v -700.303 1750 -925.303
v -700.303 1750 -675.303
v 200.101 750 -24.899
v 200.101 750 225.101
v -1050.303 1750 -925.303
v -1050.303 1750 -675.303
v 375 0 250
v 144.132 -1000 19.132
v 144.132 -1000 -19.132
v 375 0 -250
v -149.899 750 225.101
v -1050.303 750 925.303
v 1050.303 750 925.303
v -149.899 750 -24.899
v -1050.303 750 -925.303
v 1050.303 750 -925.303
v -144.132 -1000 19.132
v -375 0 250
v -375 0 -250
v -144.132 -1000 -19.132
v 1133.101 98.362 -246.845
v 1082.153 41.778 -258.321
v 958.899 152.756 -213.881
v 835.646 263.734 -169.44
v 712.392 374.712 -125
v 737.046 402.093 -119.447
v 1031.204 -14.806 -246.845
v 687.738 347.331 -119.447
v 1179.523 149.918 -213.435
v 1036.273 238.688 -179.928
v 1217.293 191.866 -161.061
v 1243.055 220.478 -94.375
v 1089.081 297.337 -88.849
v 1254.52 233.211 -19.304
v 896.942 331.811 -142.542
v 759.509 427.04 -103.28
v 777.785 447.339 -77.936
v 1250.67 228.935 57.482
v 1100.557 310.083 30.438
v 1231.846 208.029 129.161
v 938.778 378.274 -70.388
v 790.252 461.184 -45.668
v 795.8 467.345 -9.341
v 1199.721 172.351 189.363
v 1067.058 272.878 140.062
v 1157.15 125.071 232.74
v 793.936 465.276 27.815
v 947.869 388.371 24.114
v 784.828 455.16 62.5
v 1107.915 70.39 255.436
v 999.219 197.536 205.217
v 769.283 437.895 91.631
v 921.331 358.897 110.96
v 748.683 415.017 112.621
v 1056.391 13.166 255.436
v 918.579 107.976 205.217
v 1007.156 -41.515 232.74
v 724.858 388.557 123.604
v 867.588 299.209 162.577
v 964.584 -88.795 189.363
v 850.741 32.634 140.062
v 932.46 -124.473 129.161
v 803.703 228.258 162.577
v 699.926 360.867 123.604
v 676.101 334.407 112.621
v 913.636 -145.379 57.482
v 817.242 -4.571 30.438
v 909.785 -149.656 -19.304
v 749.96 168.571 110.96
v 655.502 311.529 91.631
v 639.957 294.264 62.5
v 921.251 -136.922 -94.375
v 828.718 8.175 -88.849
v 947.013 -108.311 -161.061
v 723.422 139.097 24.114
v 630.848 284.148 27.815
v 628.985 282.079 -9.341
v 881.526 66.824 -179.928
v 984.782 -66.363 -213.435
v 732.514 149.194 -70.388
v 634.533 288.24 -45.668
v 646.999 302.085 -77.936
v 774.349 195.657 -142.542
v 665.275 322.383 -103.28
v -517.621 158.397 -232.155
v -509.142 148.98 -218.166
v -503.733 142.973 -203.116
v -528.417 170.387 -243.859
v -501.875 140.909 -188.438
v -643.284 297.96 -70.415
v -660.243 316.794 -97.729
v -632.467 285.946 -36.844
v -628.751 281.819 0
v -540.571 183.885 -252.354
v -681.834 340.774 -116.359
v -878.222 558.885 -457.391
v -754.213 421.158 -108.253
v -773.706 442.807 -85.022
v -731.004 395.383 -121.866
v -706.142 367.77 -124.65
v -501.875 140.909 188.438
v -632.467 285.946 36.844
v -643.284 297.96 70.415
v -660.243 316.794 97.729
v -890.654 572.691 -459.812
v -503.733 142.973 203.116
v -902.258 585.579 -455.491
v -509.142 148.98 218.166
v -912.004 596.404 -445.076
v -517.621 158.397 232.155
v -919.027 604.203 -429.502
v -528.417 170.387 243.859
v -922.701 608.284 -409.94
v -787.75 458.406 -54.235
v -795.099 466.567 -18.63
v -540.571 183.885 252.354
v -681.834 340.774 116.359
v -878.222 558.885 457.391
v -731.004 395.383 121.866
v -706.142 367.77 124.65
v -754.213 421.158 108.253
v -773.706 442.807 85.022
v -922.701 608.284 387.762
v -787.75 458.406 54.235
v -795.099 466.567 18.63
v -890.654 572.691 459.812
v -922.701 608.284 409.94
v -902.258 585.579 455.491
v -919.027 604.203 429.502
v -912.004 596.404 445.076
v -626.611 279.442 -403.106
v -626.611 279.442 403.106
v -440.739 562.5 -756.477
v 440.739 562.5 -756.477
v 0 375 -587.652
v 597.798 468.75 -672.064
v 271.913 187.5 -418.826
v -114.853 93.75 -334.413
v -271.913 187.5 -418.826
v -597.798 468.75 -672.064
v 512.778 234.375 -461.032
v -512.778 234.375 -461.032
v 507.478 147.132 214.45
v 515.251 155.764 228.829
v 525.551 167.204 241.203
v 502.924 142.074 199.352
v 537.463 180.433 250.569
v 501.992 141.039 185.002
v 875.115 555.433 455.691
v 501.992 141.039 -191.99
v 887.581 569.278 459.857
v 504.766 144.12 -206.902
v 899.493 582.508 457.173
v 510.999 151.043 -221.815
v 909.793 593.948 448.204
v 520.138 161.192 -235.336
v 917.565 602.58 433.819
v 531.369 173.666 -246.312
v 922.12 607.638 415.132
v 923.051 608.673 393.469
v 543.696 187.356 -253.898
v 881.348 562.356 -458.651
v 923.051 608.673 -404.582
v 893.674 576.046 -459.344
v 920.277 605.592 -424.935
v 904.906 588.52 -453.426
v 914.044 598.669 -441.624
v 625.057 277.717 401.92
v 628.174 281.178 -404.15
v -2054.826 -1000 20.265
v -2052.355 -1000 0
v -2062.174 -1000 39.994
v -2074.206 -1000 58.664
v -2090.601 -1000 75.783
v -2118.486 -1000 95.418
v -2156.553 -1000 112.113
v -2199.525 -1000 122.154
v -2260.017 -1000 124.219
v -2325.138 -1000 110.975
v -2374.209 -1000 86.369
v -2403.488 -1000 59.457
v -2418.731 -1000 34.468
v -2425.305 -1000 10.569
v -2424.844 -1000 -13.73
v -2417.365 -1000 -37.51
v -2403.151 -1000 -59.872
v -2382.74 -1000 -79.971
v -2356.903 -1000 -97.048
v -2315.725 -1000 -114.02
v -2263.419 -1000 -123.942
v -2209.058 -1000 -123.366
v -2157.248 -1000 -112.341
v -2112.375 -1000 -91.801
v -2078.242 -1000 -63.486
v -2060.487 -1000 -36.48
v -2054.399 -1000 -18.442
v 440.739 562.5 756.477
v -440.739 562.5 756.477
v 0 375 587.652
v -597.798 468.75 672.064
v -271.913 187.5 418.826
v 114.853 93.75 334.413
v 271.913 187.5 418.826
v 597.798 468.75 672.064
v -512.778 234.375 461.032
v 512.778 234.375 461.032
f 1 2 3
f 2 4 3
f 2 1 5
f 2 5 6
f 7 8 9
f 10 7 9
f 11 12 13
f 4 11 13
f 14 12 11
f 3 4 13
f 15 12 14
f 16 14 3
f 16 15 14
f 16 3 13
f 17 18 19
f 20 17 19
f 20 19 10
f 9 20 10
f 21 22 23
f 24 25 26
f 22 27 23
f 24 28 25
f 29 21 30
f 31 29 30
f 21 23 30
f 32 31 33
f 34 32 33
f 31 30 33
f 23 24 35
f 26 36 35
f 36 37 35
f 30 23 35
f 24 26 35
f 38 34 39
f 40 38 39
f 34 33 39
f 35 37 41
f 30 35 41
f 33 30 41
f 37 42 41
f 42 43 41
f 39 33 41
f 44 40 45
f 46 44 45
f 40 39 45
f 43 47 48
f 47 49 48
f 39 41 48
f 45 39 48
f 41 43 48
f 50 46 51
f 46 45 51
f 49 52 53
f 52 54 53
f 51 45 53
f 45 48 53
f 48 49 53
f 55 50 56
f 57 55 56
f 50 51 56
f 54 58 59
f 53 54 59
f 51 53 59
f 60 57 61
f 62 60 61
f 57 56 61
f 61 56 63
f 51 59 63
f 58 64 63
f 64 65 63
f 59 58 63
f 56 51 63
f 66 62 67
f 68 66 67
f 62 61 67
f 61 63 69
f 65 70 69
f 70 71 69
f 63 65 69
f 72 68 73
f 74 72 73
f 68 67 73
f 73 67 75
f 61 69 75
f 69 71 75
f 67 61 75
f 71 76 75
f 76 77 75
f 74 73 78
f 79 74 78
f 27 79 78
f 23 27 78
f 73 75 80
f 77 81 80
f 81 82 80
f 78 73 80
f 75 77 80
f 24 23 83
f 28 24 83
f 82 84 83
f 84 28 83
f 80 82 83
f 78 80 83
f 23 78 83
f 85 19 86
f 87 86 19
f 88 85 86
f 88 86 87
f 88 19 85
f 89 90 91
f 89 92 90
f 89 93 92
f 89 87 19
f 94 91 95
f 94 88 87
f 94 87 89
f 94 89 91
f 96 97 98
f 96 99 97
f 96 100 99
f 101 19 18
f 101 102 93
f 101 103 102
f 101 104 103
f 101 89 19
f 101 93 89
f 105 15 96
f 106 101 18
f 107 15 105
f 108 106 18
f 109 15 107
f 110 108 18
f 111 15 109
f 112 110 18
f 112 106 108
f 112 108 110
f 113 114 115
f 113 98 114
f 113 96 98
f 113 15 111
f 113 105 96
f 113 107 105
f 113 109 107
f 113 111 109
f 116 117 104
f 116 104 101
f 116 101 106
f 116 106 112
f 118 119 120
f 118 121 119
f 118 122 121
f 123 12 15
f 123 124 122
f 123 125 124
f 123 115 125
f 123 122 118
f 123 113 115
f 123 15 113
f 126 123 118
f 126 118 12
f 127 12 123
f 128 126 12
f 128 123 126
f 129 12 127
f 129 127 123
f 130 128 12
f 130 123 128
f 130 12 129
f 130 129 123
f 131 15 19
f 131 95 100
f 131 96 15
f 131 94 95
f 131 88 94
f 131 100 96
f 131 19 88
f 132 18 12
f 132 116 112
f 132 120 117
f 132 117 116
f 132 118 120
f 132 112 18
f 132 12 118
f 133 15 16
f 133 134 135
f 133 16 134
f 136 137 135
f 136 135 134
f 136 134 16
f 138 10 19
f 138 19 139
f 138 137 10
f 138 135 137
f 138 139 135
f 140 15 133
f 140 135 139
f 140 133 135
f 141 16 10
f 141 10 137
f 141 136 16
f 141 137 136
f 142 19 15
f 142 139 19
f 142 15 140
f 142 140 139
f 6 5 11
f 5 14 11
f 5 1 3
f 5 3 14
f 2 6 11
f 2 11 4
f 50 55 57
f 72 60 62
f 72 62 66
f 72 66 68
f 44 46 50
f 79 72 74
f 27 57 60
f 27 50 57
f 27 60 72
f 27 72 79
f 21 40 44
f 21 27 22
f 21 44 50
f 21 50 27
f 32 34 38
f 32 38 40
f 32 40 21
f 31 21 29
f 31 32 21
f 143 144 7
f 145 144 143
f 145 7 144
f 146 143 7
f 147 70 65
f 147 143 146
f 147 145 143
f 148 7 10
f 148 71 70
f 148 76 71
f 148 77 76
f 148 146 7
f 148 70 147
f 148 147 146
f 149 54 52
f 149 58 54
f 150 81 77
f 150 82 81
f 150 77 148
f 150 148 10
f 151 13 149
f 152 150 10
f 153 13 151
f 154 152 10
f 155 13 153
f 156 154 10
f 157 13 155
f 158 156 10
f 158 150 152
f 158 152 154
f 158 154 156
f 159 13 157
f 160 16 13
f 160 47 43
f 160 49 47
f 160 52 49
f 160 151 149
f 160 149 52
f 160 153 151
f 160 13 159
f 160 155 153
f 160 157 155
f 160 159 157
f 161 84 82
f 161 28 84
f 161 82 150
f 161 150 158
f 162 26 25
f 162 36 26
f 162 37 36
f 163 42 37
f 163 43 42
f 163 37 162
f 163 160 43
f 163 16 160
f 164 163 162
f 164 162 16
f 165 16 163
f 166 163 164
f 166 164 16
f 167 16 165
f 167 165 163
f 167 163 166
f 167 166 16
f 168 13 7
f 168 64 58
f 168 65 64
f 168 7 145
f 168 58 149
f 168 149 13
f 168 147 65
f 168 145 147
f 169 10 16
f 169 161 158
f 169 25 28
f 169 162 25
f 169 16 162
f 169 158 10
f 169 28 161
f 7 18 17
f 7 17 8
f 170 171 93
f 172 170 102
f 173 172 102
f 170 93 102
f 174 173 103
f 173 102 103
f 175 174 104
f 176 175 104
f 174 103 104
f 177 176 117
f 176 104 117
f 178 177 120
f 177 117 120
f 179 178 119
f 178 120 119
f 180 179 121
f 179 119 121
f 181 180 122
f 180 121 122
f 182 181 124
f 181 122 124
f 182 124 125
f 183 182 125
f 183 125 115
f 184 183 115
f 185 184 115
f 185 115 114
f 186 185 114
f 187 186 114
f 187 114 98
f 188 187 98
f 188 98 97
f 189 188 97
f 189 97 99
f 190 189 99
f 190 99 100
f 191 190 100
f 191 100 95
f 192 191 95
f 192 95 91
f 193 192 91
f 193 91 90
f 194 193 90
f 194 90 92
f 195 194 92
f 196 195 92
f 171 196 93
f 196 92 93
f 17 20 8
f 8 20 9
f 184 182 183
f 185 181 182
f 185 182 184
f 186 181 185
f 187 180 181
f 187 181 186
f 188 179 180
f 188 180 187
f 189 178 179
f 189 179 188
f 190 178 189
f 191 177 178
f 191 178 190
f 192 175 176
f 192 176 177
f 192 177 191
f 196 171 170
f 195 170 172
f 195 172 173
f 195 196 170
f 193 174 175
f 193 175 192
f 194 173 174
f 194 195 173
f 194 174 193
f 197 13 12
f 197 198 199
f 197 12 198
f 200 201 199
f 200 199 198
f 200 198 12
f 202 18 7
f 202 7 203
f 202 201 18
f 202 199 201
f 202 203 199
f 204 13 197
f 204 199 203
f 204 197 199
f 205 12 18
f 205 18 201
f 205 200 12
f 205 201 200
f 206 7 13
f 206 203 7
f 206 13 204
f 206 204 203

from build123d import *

# Parameters (mm, degrees)
SKETCH1_W           = 750
SKETCH1_H           = 500
BOSS_EXTRUDE1_DEPTH = 1000
BOSS_EXTRUDE1_DRAFT = -13
SKETCH1_2_W         = 750
SKETCH1_2_H         = 500
BOSS_EXTRUDE2_DEPTH = 750
BOSS_EXTRUDE2_TAPER = -42
SKETCH2_R           = 125
BOSS_EXTRUDE3_DEPTH = 497.562106
BOSS_EXTRUDE3_DRAFT = -15
BOSS_EXTRUDE4_REACH = 2194.301
SKETCH4_R           = 125


with BuildPart() as part:
    # Sketch1 → Boss-Extrude1 (with draft: the straight prism first)
    with BuildSketch(Plane(origin=(0, 0, 0), x_dir=(1, 0, 0), z_dir=(0, 1, 0))):
        Rectangle(SKETCH1_W, SKETCH1_H)
    extrude(amount=-BOSS_EXTRUDE1_DEPTH)
    # Boss-Extrude1: the draft: its side faces are tilted about the plane it starts from
    boss_extrude1_sides = [part.faces().sort_by_distance(p)[0] for p in [
        (0, -500, 250),
        (375, -500, 0),
        (0, -500, -250),
        (-375, -500, 0),
    ]]
    draft(boss_extrude1_sides, Plane(origin=(0, 0, 0), x_dir=(1, 0, 0), z_dir=(0, 1, 0)), BOSS_EXTRUDE1_DRAFT)

    # Sketch1<2> → Boss-Extrude2 (add)
    with BuildSketch(Plane(origin=(0, 0, 0), x_dir=(1, 0, 0), z_dir=(0, 1, 0))):
        Rectangle(SKETCH1_2_W, SKETCH1_2_H)
    extrude(amount=BOSS_EXTRUDE2_DEPTH, taper=BOSS_EXTRUDE2_TAPER)


with BuildPart() as boss_extrude3_tool:
    # Sketch2 → Boss-Extrude3 (with draft: the straight prism first)
    with BuildSketch(Plane(origin=(207.099086863, -186.472855382, 0), x_dir=(0, 0, -1), z_dir=(0.7431448254773932, -0.6691306063588595, 0))):
        with Locations((0, 755.148524589)):
            Circle(SKETCH2_R)
    extrude(amount=BOSS_EXTRUDE3_DEPTH)
    # Boss-Extrude3: the draft: its side faces are tilted about the plane it starts from
    boss_extrude3_sides = [boss_extrude3_tool.faces().sort_by_distance(p)[0] for p in [
        (897.272429226, 208.244846289, 125),
    ]]
    draft(boss_extrude3_sides, Plane(origin=(207.099086863, -186.472855382, 0), x_dir=(0, 0, -1), z_dir=(0.7431448254773932, -0.6691306063588595, 0)), BOSS_EXTRUDE3_DRAFT)


with BuildPart() as part_1:
    add(part.part)

    # Boss-Extrude3: add boss_extrude3_tool
    add(boss_extrude3_tool.part)

    # Boss-Extrude4: up to this plane
    boss_extrude4_end = Plane(origin=(0, -1000, 0), z_dir=(0, -1, 0))
    # Sketch4 → Boss-Extrude4 (add, up to the surface)
    with BuildSketch(Plane(origin=(-207.099086863, -186.472855382, 0), x_dir=(0, 0, 1), z_dir=(-0.7431448254773932, -0.6691306063588595, 0)), mode=Mode.PRIVATE) as boss_extrude4_sk1:
        with Locations(Location((0, 755.148524589, 0), (0, 0, 270))):
            Circle(SKETCH4_R)
    boss_extrude4_tool1 = split(extrude(boss_extrude4_sk1.sketch, amount=BOSS_EXTRUDE4_REACH, mode=Mode.PRIVATE), bisect_by=boss_extrude4_end, keep=Keep.BOTH, mode=Mode.PRIVATE)
    add(boss_extrude4_tool1.solids().sort_by_distance((-712.392077, 374.711863, 0))[0])

    # Boss-Extrude5: read off the stored shape, not the designer's step
    # Boss-Extrude5: loft between two sections, ruled curve by curve
    boss_extrude5_from = [
        Edge.make_line((-1050.303033223, 1750, -675.303033223), (-700.303033223, 1750, -675.303033223)),
        Edge.make_line((-700.303033223, 1750, -675.303033223), (-700.303033223, 1750, -925.303033223)),
        Edge.make_line((-700.303033223, 1750, -925.303033223), (-1050.303033223, 1750, -925.303033223)),
        Edge.make_line((-1050.303033223, 1750, -925.303033223), (-1050.303033223, 1750, -675.303033223)),
    ]
    boss_extrude5_to = [
        Edge.make_line((-149.898988926, 750, 225.101011074), (200.101011074, 750, 225.101011074)),
        Edge.make_line((200.101011074, 750, 225.101011074), (200.101011074, 750, -24.898988926)),
        Edge.make_line((200.101011074, 750, -24.898988926), (-149.898988926, 750, -24.898988926)),
        Edge.make_line((-149.898988926, 750, -24.898988926), (-149.898988926, 750, 225.101011074)),
    ]
    boss_extrude5 = Solid(Shell([*[Face.make_surface_from_curves(boss_extrude5_from[k], boss_extrude5_to[k]) for k in range(4)], Face(Wire(boss_extrude5_from)), Face(Wire(boss_extrude5_to))]))
    add(boss_extrude5)


solid = part_1.part
